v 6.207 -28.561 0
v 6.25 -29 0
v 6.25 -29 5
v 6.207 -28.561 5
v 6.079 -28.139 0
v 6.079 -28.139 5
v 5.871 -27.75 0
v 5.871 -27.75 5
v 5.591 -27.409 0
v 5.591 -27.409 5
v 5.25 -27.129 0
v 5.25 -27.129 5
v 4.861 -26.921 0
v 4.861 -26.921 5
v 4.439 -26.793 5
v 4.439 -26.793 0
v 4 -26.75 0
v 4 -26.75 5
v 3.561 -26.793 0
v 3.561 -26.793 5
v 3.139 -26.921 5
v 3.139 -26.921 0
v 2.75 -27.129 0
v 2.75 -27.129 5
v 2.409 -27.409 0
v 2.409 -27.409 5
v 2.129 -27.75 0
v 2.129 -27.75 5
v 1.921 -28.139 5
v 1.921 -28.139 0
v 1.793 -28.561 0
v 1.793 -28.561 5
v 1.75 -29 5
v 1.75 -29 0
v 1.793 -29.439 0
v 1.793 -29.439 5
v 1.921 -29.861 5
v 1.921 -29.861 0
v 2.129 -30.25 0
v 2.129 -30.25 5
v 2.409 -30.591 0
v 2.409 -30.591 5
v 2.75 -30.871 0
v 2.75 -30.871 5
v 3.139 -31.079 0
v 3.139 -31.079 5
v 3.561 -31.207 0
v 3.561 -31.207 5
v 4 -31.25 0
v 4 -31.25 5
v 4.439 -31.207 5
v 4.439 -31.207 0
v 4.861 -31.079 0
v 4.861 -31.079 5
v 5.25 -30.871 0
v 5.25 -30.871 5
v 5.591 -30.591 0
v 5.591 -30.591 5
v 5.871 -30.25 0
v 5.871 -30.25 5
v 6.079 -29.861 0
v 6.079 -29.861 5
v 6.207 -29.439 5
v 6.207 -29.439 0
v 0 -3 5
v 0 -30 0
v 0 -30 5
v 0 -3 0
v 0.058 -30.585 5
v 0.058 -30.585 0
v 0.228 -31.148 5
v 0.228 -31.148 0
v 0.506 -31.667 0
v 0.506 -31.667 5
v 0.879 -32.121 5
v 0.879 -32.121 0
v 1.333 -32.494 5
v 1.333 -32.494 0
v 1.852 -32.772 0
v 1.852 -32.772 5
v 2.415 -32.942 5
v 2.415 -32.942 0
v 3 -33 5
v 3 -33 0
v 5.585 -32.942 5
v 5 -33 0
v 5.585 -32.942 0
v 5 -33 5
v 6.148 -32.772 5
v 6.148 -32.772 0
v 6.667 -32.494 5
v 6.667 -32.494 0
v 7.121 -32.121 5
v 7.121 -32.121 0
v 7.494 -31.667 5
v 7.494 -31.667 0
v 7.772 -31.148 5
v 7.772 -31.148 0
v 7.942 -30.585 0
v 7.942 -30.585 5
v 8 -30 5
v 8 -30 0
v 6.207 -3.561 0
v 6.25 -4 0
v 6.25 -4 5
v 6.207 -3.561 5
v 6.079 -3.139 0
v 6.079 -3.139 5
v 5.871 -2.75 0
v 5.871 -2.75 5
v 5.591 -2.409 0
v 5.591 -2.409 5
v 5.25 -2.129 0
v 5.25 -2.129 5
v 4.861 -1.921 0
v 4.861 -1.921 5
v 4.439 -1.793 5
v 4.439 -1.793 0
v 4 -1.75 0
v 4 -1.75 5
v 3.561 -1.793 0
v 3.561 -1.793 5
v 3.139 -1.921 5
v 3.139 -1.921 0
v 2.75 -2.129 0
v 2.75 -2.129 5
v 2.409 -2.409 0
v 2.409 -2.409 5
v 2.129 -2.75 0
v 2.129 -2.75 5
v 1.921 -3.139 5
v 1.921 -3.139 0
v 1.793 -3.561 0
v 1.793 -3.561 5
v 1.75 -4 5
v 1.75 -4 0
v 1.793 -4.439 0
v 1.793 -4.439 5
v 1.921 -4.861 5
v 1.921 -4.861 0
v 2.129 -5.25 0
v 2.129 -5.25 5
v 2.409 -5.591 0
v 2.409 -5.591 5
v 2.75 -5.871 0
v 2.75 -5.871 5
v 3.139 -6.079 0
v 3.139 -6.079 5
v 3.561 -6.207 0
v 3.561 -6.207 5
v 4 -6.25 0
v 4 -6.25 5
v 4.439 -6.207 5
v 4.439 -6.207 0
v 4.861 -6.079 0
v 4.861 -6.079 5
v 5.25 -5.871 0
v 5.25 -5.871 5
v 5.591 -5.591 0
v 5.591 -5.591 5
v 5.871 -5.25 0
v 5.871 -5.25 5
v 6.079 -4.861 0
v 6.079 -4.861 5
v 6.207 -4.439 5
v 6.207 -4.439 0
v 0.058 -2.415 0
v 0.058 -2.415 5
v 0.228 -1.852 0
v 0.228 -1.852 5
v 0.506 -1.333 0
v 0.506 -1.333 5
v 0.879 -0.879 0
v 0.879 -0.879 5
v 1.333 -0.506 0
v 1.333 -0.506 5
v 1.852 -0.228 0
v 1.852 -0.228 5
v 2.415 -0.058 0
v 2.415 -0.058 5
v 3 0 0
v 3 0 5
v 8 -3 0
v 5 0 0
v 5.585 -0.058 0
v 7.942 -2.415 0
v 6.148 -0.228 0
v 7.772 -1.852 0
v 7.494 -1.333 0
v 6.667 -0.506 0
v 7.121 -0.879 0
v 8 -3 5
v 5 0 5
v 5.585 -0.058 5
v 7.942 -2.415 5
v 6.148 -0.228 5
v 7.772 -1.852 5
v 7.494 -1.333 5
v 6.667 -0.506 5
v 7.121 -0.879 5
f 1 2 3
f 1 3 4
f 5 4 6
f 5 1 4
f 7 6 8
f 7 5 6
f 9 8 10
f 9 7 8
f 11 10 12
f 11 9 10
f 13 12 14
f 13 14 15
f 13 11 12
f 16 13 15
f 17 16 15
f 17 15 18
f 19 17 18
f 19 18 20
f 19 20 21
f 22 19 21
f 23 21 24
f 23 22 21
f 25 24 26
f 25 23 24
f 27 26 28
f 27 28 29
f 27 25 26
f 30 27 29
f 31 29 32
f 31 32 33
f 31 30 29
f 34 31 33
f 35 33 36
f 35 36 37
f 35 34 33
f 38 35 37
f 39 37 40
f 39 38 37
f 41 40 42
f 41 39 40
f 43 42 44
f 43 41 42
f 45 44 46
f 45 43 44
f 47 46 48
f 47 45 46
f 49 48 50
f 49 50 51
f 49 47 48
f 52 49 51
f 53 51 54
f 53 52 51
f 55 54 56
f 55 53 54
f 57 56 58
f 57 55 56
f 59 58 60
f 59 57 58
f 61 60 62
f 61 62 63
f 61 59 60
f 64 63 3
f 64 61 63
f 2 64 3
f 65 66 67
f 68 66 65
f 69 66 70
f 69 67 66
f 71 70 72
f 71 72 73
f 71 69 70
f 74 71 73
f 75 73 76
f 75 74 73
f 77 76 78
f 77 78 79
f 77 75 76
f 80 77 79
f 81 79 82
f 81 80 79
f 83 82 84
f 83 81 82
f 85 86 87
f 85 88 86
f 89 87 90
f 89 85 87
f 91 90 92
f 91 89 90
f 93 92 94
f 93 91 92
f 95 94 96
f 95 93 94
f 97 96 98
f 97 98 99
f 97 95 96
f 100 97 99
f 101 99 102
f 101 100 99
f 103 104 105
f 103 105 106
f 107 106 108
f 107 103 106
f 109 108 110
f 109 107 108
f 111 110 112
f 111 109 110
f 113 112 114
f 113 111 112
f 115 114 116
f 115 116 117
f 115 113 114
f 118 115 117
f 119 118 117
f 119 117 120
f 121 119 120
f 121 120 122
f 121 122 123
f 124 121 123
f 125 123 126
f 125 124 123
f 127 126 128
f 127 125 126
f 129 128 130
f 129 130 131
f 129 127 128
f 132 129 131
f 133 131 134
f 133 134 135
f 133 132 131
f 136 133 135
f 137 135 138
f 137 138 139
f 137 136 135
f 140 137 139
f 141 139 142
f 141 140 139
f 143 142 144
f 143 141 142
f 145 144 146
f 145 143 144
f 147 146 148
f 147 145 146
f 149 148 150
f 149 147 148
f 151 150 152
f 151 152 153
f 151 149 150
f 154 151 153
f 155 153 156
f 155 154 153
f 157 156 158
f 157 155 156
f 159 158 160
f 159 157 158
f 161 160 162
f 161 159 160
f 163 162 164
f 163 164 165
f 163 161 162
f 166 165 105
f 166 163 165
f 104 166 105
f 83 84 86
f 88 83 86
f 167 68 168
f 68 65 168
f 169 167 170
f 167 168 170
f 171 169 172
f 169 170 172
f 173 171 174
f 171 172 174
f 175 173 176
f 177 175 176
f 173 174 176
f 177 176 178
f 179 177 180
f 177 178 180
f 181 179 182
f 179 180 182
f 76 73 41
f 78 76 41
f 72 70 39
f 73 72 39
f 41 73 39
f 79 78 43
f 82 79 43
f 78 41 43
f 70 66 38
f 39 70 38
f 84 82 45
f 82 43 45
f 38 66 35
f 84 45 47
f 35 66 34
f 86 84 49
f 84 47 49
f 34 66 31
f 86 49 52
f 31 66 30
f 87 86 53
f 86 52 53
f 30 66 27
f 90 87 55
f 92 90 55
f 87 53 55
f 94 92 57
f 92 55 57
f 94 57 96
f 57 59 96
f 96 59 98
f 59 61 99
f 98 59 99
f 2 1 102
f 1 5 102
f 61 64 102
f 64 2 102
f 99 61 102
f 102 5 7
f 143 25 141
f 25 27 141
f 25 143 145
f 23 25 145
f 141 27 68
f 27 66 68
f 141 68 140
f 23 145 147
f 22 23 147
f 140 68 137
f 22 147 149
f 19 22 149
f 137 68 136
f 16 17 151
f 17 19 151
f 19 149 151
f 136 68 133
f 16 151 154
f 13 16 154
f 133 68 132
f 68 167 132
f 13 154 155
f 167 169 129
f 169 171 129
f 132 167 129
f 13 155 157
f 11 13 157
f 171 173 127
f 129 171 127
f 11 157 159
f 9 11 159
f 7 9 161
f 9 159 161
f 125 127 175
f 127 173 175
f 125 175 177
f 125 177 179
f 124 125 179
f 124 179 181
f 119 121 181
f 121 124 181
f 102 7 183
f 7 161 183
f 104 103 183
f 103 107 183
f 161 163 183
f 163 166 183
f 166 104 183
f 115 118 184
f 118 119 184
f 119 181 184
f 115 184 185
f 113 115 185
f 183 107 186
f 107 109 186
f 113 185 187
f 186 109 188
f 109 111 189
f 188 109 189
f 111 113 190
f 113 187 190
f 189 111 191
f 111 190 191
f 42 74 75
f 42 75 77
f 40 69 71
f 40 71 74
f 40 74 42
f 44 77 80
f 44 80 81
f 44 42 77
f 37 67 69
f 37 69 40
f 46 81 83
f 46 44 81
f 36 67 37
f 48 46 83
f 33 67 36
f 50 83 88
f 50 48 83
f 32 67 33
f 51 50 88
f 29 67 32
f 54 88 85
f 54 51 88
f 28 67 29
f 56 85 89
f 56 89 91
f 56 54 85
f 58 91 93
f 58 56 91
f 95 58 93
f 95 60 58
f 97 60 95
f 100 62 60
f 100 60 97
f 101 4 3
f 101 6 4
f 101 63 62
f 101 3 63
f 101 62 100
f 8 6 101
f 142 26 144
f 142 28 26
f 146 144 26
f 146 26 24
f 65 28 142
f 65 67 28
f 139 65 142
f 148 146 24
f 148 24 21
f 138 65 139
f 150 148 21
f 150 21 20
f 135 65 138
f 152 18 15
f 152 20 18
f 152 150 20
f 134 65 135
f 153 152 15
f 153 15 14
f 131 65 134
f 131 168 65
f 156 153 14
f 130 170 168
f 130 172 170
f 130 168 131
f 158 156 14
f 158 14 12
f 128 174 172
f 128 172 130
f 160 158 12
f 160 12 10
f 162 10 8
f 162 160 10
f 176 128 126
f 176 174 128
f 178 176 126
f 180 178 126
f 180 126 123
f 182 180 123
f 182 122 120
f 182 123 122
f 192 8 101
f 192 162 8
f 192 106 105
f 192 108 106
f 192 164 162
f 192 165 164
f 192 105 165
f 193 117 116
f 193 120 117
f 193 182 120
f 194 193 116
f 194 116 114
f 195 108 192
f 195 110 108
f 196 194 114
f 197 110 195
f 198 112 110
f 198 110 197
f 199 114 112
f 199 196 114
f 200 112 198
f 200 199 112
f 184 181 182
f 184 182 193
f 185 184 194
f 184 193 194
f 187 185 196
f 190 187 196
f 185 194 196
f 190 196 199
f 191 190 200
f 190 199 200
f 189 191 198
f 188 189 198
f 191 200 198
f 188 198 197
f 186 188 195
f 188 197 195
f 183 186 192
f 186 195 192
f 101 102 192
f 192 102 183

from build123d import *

# Parameters (mm, degrees)
SKETCH1_W           = 8
SKETCH1_H           = 33
SKETCH1_R           = 2.25
BOSS_EXTRUDE1_DEPTH = 5
FILLET1_R           = 3


with BuildPart() as part:
    # Sketch1 → Boss-Extrude1 (new body)
    with BuildSketch(Plane.XY):
        with Locations((4, -16.5)):
            Rectangle(SKETCH1_W, SKETCH1_H)
        with Locations((4, -29)):
            Circle(SKETCH1_R, mode=Mode.SUBTRACT)
        with Locations((4, -4)):
            Circle(SKETCH1_R, mode=Mode.SUBTRACT)
    extrude(amount=BOSS_EXTRUDE1_DEPTH)

    # Fillet1
    fillet1_edges = [part.edges().sort_by_distance(p)[0] for p in [
        (0, 0, 2.5),
        (8, 0, 2.5),
        (8, -33, 2.5),
        (0, -33, 2.5),
    ]]
    fillet(fillet1_edges, radius=FILLET1_R)


solid = part.part
